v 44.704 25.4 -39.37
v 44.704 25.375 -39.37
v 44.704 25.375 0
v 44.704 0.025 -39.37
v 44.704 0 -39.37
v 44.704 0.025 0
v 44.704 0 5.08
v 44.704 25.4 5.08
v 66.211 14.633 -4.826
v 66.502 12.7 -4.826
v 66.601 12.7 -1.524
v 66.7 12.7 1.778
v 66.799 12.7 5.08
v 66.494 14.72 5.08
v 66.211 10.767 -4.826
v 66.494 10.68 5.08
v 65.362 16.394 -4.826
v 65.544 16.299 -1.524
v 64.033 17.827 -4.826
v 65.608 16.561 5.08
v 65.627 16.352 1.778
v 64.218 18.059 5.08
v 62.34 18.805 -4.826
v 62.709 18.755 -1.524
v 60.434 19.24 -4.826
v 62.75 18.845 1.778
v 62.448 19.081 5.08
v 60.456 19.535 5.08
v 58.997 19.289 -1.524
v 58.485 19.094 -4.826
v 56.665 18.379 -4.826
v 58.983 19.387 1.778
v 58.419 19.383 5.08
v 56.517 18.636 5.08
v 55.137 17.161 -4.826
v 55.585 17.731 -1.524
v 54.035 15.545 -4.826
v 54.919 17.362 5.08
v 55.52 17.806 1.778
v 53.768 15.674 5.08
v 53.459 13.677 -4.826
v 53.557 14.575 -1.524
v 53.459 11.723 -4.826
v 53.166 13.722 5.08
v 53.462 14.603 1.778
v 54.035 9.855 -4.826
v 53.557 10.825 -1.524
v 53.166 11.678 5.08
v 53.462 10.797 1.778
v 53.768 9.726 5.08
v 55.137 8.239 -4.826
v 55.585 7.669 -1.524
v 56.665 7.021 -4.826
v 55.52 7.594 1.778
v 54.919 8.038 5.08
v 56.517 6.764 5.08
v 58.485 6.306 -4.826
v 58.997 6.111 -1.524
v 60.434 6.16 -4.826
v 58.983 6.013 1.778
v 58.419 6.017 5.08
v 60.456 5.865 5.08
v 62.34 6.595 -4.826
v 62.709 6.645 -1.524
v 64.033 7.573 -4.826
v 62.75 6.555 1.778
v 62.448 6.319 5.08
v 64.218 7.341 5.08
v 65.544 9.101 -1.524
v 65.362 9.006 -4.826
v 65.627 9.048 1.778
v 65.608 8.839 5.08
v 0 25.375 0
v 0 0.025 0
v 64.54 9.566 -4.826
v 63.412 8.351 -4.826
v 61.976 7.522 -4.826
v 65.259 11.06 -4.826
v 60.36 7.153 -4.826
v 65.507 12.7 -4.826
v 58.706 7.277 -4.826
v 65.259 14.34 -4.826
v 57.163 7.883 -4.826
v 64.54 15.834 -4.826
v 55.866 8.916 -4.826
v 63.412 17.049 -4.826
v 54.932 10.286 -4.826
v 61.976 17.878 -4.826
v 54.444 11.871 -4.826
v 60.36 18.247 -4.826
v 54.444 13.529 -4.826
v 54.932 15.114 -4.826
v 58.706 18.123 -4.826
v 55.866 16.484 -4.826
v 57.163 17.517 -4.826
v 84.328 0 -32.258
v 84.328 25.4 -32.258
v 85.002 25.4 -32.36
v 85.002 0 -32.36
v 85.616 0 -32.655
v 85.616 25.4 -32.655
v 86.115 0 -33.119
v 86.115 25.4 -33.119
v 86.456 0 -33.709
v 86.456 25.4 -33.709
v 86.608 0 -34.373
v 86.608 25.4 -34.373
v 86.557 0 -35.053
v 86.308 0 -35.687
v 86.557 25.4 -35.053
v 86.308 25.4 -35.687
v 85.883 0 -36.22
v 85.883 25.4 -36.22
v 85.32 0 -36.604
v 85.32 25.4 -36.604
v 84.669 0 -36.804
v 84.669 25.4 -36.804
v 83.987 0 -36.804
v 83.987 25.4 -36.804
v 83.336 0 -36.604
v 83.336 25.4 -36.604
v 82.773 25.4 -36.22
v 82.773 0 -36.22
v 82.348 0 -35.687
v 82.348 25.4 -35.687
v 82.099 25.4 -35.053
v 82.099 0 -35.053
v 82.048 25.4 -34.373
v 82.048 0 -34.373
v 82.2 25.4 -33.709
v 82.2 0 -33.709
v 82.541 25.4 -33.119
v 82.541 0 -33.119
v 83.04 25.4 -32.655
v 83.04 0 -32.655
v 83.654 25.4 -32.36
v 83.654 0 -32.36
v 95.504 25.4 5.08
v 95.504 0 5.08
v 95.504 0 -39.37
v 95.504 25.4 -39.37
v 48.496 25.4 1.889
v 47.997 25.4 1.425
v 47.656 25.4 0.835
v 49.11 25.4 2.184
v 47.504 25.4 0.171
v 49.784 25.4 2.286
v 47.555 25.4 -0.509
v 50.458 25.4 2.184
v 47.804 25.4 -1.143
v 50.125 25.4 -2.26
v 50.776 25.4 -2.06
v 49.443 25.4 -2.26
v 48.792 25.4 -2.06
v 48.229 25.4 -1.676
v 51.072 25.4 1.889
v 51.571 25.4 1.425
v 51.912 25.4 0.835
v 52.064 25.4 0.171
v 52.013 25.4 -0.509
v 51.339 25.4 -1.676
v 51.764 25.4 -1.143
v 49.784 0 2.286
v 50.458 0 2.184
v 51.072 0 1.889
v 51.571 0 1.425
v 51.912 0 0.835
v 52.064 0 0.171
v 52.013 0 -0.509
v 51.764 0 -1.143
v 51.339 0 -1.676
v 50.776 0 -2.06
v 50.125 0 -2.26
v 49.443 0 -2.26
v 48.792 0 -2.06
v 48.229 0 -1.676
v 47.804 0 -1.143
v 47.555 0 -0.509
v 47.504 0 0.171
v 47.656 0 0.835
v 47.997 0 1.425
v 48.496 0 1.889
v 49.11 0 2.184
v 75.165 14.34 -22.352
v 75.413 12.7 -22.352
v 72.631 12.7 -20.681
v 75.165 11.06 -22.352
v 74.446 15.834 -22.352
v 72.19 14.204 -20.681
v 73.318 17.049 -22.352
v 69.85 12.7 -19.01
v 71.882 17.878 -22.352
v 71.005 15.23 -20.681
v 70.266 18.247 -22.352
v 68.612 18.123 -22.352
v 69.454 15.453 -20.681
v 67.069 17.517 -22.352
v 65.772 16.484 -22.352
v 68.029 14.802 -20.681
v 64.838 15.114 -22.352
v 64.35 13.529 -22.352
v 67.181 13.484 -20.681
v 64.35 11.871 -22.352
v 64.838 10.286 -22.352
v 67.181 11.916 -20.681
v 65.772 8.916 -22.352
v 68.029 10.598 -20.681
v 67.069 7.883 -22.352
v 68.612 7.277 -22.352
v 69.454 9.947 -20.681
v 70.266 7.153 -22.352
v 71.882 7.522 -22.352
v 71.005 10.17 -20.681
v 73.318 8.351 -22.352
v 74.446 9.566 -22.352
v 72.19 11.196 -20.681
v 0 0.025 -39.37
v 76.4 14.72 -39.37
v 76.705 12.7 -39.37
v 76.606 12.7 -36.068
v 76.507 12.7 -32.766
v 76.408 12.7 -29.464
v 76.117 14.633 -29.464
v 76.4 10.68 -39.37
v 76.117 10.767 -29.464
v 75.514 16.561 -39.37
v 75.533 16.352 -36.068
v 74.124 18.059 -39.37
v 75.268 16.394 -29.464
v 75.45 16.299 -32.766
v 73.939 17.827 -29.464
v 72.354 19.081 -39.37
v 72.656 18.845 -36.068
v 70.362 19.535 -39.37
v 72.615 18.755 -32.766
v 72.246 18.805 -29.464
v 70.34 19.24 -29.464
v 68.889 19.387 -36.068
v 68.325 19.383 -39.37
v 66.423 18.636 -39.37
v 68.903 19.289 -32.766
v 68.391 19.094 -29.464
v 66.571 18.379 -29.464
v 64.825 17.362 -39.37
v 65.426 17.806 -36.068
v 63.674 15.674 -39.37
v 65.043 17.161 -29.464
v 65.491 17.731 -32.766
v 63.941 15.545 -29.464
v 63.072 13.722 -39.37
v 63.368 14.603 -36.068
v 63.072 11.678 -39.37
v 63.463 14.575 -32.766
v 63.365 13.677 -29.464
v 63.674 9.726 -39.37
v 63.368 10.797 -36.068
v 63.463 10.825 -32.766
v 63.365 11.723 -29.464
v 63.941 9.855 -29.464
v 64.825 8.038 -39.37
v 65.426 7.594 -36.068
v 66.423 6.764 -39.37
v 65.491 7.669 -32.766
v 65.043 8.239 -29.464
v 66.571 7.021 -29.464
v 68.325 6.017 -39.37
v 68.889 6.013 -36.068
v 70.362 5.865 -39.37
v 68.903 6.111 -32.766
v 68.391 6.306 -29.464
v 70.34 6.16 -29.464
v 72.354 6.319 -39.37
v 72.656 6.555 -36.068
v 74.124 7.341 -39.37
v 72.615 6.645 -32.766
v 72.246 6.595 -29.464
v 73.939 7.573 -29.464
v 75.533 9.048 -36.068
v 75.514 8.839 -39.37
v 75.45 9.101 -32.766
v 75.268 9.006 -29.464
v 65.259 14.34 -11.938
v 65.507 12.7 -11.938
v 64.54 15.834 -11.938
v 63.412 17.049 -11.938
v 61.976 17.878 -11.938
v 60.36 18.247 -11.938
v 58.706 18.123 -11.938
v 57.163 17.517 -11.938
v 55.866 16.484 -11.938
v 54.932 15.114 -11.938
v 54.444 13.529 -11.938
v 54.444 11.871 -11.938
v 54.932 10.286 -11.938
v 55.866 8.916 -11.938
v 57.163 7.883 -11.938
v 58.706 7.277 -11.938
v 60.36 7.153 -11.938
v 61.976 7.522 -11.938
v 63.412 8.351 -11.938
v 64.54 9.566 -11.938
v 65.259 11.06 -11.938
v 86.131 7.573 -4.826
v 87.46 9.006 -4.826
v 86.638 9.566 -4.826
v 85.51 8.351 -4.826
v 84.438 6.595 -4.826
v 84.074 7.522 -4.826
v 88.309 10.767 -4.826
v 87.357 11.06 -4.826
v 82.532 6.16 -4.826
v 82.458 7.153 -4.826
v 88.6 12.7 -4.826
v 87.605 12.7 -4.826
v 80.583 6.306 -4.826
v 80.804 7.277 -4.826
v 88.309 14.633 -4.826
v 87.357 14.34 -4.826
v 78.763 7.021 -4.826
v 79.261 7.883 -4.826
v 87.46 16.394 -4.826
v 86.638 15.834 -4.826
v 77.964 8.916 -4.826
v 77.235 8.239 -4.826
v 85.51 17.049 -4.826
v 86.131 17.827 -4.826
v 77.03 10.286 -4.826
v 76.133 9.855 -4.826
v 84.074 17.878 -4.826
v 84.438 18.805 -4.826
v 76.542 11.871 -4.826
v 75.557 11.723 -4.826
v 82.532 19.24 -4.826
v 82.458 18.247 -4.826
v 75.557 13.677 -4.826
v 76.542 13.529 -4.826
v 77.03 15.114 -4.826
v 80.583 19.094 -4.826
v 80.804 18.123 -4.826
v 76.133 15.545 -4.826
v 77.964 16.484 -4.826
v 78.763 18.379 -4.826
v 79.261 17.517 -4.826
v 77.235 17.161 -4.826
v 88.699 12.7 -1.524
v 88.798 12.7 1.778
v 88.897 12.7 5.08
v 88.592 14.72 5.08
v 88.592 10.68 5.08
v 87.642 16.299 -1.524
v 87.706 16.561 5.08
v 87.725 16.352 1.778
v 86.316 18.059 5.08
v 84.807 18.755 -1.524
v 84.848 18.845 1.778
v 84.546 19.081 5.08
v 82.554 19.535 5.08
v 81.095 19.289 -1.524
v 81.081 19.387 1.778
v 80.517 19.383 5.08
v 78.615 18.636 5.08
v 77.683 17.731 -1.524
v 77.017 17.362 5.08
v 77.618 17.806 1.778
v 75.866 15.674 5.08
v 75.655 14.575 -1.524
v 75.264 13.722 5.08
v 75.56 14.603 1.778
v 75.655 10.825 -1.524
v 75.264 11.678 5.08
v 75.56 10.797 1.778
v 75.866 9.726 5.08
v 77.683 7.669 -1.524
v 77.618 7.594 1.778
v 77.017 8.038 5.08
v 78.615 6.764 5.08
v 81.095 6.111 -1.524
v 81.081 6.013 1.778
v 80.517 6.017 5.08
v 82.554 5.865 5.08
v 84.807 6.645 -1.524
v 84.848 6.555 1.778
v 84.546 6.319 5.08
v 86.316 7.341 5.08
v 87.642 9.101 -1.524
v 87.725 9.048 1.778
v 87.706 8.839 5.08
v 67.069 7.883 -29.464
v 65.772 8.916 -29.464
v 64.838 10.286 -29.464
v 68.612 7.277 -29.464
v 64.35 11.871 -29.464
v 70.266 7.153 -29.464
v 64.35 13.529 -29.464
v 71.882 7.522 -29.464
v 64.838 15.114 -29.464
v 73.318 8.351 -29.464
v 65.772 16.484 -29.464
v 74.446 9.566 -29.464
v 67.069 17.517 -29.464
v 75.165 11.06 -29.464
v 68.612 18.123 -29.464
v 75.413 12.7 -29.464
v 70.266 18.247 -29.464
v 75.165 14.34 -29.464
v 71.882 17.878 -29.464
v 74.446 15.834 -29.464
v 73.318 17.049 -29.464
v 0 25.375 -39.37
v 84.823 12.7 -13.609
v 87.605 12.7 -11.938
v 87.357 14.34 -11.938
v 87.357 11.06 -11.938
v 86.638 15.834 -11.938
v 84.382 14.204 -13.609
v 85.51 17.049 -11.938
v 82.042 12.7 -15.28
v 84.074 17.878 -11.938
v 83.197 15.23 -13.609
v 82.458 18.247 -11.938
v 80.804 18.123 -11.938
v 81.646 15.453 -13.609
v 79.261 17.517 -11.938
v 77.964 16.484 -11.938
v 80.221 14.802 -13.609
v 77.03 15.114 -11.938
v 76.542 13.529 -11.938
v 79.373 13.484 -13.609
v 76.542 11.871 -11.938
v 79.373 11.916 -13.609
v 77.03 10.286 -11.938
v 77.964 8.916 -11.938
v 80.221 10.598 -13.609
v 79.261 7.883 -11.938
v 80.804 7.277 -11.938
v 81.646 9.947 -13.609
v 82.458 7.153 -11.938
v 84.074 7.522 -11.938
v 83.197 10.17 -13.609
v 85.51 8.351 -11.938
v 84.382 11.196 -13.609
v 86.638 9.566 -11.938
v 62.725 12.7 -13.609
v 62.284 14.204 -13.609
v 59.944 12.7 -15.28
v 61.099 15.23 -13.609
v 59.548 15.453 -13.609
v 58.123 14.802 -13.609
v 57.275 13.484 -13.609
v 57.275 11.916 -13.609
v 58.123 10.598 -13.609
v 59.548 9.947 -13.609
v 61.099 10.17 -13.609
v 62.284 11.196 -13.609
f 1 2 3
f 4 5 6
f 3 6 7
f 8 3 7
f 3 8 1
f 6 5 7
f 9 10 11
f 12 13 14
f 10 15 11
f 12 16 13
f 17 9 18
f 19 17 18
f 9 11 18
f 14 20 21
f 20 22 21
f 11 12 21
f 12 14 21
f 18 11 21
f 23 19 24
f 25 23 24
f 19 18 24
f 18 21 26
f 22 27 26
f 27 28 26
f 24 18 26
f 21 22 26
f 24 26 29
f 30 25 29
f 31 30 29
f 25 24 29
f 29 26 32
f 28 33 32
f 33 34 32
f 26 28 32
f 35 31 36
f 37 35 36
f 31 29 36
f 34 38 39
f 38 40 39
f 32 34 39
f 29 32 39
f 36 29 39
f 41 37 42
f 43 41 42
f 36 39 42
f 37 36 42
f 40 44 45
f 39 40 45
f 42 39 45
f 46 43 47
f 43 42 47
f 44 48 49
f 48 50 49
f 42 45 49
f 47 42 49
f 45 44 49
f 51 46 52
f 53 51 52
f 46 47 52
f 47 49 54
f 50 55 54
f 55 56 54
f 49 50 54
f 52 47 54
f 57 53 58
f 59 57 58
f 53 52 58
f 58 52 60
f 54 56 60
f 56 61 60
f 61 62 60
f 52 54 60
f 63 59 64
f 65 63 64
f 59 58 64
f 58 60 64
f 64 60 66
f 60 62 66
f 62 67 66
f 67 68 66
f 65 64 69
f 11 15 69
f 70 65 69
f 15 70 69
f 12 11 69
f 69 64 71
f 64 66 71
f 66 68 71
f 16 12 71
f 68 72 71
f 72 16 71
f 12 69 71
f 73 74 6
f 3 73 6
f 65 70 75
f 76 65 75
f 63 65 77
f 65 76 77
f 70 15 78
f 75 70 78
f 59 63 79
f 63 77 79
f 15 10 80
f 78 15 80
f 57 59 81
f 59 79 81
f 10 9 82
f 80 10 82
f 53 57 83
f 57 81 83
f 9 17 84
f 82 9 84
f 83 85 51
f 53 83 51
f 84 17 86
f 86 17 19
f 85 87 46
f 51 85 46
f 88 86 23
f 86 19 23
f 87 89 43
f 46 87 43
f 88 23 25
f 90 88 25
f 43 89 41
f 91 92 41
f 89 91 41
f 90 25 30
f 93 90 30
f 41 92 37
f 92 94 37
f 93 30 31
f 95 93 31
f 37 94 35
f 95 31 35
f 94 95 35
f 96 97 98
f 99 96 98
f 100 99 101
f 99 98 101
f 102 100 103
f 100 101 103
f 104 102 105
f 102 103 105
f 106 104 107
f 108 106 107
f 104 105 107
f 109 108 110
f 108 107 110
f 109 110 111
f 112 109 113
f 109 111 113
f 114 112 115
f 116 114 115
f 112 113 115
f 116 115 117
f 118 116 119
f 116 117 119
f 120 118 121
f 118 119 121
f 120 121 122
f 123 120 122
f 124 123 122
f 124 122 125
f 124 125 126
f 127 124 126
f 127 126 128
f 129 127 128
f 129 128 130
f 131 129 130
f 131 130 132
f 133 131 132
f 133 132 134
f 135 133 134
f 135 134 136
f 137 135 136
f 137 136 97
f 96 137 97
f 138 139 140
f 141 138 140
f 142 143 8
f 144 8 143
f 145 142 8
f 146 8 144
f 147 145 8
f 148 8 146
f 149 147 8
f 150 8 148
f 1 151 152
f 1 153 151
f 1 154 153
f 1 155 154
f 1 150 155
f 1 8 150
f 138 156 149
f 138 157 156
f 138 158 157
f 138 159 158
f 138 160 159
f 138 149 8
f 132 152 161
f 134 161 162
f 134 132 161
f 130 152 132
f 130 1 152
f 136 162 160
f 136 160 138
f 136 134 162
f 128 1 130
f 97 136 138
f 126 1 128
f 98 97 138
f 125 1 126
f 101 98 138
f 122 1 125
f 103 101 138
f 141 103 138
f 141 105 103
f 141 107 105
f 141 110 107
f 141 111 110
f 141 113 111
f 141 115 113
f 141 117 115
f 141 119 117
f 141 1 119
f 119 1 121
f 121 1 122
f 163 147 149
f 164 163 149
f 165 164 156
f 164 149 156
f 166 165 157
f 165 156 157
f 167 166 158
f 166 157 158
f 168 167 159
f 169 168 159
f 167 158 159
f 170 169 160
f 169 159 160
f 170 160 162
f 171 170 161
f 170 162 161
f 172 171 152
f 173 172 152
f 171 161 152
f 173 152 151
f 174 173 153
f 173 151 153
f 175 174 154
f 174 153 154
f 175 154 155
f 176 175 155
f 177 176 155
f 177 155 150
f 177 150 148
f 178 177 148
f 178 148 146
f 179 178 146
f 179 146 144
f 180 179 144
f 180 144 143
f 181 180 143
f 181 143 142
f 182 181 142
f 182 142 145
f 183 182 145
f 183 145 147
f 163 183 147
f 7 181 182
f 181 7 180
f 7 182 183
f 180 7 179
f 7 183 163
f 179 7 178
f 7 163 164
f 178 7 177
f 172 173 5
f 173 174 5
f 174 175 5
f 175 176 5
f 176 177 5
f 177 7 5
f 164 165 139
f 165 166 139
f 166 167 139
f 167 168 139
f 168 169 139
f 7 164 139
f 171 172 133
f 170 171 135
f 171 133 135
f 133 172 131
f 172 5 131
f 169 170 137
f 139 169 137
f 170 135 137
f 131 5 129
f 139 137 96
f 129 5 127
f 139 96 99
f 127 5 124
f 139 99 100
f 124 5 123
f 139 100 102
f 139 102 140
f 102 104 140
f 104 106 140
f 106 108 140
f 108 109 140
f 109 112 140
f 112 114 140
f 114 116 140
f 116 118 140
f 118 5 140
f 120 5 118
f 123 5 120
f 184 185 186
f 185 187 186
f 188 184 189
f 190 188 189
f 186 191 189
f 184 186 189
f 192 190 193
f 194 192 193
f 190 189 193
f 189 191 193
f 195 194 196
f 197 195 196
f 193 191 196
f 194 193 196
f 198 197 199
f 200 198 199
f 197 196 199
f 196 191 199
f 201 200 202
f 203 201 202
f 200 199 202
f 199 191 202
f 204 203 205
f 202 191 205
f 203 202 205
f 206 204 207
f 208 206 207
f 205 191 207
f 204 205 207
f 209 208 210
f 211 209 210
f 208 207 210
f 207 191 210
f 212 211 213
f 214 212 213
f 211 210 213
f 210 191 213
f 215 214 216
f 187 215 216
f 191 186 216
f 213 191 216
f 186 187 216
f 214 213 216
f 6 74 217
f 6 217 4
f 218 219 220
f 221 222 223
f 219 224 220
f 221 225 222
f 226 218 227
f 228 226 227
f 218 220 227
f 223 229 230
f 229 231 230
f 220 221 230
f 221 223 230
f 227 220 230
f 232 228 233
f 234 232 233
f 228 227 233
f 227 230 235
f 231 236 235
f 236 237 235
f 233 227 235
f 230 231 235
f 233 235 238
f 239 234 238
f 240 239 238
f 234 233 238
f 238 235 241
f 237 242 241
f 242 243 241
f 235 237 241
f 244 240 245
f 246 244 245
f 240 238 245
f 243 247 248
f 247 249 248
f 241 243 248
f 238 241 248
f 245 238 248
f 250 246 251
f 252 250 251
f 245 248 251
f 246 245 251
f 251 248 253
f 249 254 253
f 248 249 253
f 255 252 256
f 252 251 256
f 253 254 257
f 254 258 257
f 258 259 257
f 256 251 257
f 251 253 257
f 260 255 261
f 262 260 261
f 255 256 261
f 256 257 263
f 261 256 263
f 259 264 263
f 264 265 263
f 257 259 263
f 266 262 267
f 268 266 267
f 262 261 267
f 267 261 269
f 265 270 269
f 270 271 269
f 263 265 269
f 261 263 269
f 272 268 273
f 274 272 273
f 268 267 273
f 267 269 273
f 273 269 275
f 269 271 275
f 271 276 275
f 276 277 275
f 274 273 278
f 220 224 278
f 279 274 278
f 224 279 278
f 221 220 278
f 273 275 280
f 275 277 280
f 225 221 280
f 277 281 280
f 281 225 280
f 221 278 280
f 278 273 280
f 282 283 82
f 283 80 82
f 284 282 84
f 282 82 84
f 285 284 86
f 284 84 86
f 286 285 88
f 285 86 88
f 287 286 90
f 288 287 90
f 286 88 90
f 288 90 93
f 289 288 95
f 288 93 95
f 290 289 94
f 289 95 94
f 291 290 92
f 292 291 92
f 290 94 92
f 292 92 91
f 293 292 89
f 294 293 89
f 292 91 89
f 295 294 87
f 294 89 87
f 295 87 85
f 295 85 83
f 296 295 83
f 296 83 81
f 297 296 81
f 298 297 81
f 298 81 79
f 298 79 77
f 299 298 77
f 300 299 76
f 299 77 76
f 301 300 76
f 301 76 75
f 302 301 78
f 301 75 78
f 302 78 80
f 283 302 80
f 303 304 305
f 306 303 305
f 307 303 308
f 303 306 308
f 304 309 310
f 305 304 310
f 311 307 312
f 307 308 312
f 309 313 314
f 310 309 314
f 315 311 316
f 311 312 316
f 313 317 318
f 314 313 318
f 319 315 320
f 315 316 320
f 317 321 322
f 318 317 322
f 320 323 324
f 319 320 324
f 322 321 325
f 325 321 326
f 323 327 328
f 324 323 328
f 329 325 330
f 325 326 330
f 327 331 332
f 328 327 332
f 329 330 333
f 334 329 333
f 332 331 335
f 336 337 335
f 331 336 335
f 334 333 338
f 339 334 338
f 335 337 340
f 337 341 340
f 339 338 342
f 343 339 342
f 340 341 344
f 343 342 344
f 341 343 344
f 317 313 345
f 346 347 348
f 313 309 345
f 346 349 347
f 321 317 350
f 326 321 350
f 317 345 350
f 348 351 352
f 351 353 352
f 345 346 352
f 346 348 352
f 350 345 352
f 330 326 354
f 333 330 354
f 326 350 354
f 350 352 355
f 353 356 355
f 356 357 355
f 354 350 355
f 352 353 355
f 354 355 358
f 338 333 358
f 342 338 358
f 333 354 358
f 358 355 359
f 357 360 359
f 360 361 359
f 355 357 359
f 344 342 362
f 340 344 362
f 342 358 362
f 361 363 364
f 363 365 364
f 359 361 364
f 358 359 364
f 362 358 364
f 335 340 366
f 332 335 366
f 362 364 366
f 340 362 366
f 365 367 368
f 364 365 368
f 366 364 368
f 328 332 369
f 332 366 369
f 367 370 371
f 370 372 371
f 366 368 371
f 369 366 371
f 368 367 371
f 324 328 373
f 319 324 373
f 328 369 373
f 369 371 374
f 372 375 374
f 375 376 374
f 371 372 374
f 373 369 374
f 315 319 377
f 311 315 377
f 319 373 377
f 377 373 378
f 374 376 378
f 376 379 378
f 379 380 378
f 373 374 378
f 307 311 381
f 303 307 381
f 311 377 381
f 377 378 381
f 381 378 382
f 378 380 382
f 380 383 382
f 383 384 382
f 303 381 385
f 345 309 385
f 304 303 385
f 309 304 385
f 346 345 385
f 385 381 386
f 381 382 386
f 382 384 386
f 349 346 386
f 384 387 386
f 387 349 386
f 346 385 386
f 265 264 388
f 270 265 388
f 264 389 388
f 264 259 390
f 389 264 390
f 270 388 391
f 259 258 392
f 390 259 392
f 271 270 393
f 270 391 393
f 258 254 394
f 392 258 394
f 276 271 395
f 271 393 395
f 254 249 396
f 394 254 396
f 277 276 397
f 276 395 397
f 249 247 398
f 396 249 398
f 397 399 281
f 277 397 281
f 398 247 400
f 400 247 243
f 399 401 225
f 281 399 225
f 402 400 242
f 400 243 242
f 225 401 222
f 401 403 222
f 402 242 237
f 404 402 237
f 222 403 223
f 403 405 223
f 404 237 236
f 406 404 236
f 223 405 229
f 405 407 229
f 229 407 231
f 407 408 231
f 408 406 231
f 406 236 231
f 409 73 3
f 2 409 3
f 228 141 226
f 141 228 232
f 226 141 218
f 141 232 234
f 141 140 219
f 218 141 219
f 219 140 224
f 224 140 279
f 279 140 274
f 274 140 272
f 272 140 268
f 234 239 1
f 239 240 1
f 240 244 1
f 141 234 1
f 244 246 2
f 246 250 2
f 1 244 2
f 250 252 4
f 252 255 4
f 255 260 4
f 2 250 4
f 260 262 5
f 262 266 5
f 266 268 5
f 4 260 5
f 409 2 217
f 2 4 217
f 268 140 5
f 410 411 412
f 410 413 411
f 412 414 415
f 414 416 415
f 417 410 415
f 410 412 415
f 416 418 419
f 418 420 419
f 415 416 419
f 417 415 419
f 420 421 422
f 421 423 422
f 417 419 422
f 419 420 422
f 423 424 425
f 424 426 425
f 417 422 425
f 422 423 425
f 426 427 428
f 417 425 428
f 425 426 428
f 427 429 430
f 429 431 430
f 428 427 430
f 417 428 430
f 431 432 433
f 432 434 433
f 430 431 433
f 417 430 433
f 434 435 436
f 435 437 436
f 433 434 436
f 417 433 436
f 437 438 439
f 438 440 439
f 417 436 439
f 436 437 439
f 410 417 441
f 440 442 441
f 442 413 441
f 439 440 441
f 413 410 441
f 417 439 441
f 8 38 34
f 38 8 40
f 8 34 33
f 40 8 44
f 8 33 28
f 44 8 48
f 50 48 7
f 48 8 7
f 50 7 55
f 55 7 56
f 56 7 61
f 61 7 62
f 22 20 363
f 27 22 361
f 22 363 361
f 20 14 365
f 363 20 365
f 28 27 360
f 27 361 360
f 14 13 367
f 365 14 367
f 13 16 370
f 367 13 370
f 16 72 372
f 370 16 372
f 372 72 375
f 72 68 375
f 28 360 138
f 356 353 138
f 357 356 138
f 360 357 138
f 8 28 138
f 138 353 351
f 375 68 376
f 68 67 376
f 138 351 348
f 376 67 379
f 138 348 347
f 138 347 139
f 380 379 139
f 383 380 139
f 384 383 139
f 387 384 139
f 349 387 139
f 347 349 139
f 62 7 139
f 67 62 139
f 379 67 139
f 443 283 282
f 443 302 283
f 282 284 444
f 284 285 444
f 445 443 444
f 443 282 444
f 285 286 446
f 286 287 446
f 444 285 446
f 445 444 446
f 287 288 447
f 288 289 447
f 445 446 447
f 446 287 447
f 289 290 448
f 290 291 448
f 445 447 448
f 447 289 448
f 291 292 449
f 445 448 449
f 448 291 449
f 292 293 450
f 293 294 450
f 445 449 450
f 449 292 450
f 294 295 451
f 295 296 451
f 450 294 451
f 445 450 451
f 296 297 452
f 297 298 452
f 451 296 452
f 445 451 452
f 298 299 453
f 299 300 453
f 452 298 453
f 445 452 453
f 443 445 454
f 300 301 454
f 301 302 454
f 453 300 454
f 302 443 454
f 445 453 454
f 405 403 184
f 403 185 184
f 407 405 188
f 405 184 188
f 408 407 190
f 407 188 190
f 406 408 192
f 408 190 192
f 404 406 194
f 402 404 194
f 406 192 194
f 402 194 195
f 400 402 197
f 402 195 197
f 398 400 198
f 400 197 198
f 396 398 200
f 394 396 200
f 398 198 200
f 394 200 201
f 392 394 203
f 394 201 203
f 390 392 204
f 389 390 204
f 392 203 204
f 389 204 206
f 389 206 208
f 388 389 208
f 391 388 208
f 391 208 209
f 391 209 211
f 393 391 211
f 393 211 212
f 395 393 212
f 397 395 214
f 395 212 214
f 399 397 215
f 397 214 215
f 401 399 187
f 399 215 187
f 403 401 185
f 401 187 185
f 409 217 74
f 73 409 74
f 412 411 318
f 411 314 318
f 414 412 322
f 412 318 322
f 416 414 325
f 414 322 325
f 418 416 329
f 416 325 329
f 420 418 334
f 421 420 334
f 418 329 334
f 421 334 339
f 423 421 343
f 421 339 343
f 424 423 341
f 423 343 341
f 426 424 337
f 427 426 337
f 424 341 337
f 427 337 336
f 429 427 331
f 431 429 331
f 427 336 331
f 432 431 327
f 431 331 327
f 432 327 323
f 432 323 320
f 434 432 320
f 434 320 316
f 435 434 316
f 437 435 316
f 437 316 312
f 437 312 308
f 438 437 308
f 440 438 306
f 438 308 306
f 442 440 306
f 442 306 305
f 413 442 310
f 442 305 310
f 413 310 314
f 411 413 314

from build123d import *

# Parameters (mm, degrees)
BOSS_EXTRUDE1_DEPTH = 25.4
SKETCH2_W           = 44.704
SKETCH2_H           = 0.0254
CUT_EXTRUDE1_DEPTH  = 107.377492525
SKETCH3_R           = 2.286
CUT_EXTRUDE2_DEPTH  = 107.377492525


# Read off the part's stored shape, not the designer's step: 1/4 NPT Tapped Hole1
with BuildPart() as part:
    # Sketch1 → Boss-Extrude1 (new body)
    with BuildSketch(Plane(origin=(0, 0, 0), x_dir=(1, 0, 0), z_dir=(0, 1, 0))):
        Polygon((44.704, -5.08), (95.504, -5.08), (95.504, 39.37), (0, 39.37), (0, 0), (44.704, 0), align=None)
    extrude(amount=BOSS_EXTRUDE1_DEPTH)

    # Sketch2 → Cut-Extrude1 (cut, through all)
    with BuildSketch(Plane.XY):
        with Locations((22.352, 25.3873)):
            Rectangle(SKETCH2_W, SKETCH2_H)
        with Locations((22.352, 0.0127)):
            Rectangle(SKETCH2_W, SKETCH2_H)
    extrude(amount=-CUT_EXTRUDE1_DEPTH, mode=Mode.SUBTRACT)

    # Sketch3 → Cut-Extrude2 (cut, through all)
    with BuildSketch(Plane(origin=(0, 25.4, 0), x_dir=(1, 0, 0), z_dir=(0, 1, 0))):
        with Locations(Location((49.784, 0, 0), (0, 0, 270))):
            Circle(SKETCH3_R)
        with Locations(Location((84.328, 34.544, 0), (0, 0, 270))):
            Circle(SKETCH3_R)
    extrude(amount=-CUT_EXTRUDE2_DEPTH, mode=Mode.SUBTRACT)

    # 1/4 NPT Tapped Hole1 outline → 1/4 NPT Tapped Hole1 (revolve, cut)
    with BuildSketch(Plane(origin=(69.85, 12.7, 0), x_dir=(1, 0, 0), z_dir=(0, -1, 0))):
        Polygon((5.5626, -22.352), (0, -19.009652721), (0, -39.37), (6.8545837, -39.37), (6.557984794, -29.464), (5.5626, -29.464), align=None)
    revolve(axis=Axis((69.85, 12.7, 0), (0, 0, 1)), mode=Mode.SUBTRACT)

    # 1_4 NPT Tapped Hole1 2 outline → 1_4 NPT Tapped Hole1 2 (revolve, cut)
    with BuildSketch(Plane(origin=(82.042, 12.7, 0), x_dir=(1, 0, 0), z_dir=(0, -1, 0))):
        Polygon((0, 5.08), (0, -15.280347279), (5.5626, -11.938), (5.5626, -4.826), (6.557984794, -4.826), (6.8545837, 5.08), align=None)
    revolve(axis=Axis((82.042, 12.7, 0), (0, 0, 1)), mode=Mode.SUBTRACT)

    # 1_4 NPT Tapped Hole1 3 outline → 1_4 NPT Tapped Hole1 3 (revolve, cut)
    with BuildSketch(Plane(origin=(59.944, 12.7, 0), x_dir=(1, 0, 0), z_dir=(0, -1, 0))):
        Polygon((6.8545837, 5.08), (0, 5.08), (0, -15.280347279), (5.5626, -11.938), (5.5626, -4.826), (6.557984794, -4.826), align=None)
    revolve(axis=Axis((59.944, 12.7, 0), (0, 0, 1)), mode=Mode.SUBTRACT)


solid = part.part
